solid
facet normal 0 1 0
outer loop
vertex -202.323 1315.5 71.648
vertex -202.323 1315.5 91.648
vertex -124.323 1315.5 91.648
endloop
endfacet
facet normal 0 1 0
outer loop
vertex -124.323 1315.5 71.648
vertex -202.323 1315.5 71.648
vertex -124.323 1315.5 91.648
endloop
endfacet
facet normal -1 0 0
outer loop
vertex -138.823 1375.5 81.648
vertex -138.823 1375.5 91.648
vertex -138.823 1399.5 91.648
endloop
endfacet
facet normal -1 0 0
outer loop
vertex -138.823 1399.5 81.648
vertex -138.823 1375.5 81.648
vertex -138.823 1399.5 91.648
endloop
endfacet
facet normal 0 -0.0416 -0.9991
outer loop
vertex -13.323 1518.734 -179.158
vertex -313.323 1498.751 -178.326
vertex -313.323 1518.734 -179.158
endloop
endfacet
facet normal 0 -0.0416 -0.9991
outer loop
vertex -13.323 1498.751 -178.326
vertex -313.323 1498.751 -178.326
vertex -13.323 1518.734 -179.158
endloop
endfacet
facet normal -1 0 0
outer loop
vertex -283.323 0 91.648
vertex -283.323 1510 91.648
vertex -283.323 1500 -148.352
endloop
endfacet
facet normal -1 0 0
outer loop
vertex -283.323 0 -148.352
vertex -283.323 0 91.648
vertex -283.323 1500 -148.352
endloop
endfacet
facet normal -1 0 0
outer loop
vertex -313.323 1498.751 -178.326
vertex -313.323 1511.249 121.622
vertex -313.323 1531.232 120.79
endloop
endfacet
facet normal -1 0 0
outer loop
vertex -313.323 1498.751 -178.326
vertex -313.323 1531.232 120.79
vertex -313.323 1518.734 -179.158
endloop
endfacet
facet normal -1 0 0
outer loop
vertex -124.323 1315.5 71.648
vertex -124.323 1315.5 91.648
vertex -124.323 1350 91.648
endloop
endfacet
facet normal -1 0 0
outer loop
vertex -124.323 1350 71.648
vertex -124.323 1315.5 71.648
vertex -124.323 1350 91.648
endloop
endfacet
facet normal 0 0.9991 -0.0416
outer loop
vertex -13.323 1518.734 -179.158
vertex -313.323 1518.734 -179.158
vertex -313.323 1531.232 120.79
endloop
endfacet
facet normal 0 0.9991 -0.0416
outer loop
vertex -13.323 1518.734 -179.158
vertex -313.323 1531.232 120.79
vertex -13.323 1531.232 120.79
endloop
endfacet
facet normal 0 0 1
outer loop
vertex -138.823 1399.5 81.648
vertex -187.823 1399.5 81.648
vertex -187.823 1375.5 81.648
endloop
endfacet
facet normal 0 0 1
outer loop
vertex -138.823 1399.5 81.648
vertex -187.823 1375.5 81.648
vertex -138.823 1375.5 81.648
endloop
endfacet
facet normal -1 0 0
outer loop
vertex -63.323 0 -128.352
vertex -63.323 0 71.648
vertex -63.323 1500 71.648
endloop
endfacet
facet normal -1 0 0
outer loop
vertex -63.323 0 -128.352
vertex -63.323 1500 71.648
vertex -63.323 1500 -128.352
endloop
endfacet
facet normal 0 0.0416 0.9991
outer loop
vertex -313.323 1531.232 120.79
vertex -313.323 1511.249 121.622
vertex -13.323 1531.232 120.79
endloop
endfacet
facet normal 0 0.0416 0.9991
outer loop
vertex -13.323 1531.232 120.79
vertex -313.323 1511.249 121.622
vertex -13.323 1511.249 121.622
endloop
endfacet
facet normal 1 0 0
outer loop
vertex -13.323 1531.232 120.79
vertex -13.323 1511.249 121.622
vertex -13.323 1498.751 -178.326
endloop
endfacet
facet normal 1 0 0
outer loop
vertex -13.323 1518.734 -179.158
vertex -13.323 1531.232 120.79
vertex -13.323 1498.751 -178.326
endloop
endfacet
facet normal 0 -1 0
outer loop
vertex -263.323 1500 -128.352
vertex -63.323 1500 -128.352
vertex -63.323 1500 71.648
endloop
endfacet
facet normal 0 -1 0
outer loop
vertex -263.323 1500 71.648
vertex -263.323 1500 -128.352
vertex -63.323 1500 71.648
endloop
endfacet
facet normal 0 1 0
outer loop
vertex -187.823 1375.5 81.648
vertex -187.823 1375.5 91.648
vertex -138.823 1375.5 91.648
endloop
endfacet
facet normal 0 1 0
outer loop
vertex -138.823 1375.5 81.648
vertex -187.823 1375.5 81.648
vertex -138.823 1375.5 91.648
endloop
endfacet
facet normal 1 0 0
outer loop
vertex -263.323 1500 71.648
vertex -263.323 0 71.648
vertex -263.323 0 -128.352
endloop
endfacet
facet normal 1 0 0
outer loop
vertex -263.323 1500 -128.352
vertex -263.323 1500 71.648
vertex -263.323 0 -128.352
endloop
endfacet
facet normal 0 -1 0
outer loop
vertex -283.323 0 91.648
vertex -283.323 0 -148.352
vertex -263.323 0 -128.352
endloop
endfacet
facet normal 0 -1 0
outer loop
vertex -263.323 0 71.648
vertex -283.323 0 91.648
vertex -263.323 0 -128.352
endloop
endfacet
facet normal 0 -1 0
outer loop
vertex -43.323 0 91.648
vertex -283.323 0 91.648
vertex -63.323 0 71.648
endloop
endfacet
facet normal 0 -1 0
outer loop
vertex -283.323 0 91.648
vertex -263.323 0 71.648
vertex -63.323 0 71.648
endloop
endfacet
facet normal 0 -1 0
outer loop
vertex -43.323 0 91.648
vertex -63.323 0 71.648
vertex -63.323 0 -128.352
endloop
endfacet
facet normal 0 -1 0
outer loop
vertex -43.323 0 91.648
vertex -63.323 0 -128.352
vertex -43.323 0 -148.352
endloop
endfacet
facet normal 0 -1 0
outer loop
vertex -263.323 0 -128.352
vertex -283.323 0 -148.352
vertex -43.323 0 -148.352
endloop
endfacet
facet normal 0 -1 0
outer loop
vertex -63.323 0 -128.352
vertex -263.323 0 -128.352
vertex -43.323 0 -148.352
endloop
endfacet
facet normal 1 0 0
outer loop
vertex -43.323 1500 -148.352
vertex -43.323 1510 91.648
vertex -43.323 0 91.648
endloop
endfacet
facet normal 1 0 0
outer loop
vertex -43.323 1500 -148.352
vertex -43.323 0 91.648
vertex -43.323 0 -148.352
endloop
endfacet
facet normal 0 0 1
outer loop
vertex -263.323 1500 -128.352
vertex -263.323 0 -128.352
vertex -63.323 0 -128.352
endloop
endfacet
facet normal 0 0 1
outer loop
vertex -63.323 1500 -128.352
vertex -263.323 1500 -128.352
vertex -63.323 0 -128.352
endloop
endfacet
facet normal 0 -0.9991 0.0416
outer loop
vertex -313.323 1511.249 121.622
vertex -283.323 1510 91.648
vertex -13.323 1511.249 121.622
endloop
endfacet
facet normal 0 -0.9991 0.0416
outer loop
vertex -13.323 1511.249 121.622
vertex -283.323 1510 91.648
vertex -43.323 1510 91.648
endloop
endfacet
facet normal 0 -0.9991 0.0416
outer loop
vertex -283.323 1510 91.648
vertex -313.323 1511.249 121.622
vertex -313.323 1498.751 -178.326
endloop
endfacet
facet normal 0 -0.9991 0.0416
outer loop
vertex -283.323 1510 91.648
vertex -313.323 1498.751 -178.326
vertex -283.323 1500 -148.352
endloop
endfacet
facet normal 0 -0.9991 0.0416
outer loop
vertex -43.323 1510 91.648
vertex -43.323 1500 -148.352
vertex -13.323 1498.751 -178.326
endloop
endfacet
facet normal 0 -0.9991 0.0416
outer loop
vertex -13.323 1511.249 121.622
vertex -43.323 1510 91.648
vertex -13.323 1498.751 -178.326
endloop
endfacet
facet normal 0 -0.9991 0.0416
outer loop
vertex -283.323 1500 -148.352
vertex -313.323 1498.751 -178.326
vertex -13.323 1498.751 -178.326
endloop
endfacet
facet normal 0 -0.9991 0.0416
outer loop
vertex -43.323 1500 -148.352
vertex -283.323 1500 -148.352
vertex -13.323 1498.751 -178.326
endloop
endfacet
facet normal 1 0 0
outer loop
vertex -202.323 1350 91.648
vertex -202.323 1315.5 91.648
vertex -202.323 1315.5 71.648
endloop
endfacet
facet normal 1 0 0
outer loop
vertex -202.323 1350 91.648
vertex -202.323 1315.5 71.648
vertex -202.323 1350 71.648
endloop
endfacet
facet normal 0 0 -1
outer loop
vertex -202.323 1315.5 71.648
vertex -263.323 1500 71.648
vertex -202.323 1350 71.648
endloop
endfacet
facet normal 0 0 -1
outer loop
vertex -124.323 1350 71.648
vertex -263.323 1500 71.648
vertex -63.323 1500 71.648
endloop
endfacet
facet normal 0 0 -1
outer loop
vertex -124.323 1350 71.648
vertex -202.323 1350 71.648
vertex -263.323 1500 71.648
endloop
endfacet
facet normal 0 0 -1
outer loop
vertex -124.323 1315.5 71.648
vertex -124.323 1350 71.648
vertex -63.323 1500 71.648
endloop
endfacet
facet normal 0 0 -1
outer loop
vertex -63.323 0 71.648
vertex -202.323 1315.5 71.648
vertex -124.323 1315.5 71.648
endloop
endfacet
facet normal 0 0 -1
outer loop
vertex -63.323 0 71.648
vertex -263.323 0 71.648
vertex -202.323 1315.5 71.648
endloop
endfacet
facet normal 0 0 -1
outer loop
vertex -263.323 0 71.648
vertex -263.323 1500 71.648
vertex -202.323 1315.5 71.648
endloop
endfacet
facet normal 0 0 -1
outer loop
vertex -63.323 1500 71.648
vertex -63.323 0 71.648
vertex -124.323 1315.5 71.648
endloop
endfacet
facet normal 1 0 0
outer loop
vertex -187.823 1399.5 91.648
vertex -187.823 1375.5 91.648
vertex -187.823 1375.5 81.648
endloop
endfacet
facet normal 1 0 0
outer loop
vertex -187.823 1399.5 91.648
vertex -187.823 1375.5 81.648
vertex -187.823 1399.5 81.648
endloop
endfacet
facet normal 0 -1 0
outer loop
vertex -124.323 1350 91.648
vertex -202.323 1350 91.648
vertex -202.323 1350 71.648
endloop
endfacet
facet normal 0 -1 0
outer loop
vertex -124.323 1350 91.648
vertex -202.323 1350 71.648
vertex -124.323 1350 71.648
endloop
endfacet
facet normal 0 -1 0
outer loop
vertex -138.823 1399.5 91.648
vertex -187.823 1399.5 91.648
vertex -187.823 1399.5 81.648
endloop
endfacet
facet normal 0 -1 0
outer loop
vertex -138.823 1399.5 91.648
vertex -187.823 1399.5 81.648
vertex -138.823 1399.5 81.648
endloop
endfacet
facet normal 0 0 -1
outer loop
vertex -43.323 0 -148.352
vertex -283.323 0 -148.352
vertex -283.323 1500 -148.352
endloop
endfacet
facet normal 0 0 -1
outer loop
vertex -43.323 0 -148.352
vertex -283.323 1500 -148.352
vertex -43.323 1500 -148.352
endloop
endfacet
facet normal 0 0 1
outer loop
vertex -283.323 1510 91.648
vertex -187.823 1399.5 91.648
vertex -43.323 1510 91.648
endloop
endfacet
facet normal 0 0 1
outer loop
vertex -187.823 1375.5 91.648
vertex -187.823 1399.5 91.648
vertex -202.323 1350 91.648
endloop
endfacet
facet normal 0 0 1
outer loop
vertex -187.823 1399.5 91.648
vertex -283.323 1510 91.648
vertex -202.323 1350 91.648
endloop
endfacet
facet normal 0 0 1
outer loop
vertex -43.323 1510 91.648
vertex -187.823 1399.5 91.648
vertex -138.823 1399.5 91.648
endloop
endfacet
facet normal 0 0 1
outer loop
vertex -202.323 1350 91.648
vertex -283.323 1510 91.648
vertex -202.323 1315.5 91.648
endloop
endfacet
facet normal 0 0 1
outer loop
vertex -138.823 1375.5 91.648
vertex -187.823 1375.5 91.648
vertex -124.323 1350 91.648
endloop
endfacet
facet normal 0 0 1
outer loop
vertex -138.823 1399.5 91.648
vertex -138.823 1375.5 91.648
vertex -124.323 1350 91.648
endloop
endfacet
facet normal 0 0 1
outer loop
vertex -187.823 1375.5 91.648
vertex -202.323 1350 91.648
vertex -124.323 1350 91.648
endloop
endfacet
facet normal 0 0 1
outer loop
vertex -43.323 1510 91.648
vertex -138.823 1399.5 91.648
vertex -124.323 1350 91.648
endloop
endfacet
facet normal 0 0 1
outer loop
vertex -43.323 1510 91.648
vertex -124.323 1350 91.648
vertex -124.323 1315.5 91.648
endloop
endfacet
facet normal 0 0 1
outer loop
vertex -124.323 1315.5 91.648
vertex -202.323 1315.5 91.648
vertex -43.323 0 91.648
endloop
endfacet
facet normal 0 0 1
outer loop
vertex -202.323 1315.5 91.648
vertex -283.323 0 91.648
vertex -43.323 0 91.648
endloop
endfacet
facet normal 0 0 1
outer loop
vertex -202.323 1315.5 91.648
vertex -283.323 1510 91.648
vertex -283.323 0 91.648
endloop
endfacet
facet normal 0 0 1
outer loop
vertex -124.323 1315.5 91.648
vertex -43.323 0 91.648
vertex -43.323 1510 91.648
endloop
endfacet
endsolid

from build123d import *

# Parameters (mm, degrees)
SKETCH_1_W          = 240
SKETCH_1_H          = 240
SKETCH_1_W_2        = 200
SKETCH_1_H_2        = 200
EXTRUDE_1_DEPTH     = 1500
SKETCH_2_W          = 78
SKETCH_2_H          = 34.5
CUT_EXTRUDE_1_DEPTH = 20
EXTRUDE_2_DEPTH     = 240
SKETCH_4_W          = 300
SKETCH_4_H          = 300.208242989
EXTRUDE_3_DEPTH     = 20
SKETCH_6_W          = 49
SKETCH_6_H          = 24
CUT_EXTRUDE_3_DEPTH = 10


with BuildPart() as part:
    # Эскиз1 → Бобышка-Вытянуть1 (new body)
    with BuildSketch(Plane(origin=(0, 0, 0), x_dir=(1, 0, 0), z_dir=(0, 1, 0))):
        with Locations((-163.322789272, 28.35162174)):
            Rectangle(SKETCH_1_W, SKETCH_1_H)
        with Locations((-163.322789272, 28.35162174)):
            Rectangle(SKETCH_1_W_2, SKETCH_1_H_2, mode=Mode.SUBTRACT)
    extrude(amount=EXTRUDE_1_DEPTH)

    # Эскиз2 → Вырез-Вытянуть1 (cut)
    with BuildSketch(Plane.XY.offset(91.64837826)):
        with Locations((-163.322789272, 1332.75)):
            Rectangle(SKETCH_2_W, SKETCH_2_H)
    extrude(amount=-CUT_EXTRUDE_1_DEPTH, mode=Mode.SUBTRACT)

    # Эскиз3 → Бобышка-Вытянуть2 (add)
    with BuildSketch(Plane.ZY.offset(283.322789272)):
        Polygon((-148.35162174, 1500), (91.64837826, 1500), (91.64837826, 1510), align=None)
    extrude(amount=-EXTRUDE_2_DEPTH)

    # Эскиз4 → Бобышка-Вытянуть3 (add)
    with BuildSketch(Plane(origin=(0, 1503.570951338, -62.648789639), x_dir=(1, 0, 0), z_dir=(0, 0.999133073092352, -0.041630544712181396))):
        with Locations((-163.322789272, -34.326926836)):
            Rectangle(SKETCH_4_W, SKETCH_4_H)
    extrude(amount=EXTRUDE_3_DEPTH)

    # Эскиз6 → Вырез-Вытянуть3 (cut)
    with BuildSketch(Plane.XY.offset(91.64837826)):
        with Locations((-163.322789272, 1387.5)):
            Rectangle(SKETCH_6_W, SKETCH_6_H)
    extrude(amount=-CUT_EXTRUDE_3_DEPTH, mode=Mode.SUBTRACT)


solid = part.part
